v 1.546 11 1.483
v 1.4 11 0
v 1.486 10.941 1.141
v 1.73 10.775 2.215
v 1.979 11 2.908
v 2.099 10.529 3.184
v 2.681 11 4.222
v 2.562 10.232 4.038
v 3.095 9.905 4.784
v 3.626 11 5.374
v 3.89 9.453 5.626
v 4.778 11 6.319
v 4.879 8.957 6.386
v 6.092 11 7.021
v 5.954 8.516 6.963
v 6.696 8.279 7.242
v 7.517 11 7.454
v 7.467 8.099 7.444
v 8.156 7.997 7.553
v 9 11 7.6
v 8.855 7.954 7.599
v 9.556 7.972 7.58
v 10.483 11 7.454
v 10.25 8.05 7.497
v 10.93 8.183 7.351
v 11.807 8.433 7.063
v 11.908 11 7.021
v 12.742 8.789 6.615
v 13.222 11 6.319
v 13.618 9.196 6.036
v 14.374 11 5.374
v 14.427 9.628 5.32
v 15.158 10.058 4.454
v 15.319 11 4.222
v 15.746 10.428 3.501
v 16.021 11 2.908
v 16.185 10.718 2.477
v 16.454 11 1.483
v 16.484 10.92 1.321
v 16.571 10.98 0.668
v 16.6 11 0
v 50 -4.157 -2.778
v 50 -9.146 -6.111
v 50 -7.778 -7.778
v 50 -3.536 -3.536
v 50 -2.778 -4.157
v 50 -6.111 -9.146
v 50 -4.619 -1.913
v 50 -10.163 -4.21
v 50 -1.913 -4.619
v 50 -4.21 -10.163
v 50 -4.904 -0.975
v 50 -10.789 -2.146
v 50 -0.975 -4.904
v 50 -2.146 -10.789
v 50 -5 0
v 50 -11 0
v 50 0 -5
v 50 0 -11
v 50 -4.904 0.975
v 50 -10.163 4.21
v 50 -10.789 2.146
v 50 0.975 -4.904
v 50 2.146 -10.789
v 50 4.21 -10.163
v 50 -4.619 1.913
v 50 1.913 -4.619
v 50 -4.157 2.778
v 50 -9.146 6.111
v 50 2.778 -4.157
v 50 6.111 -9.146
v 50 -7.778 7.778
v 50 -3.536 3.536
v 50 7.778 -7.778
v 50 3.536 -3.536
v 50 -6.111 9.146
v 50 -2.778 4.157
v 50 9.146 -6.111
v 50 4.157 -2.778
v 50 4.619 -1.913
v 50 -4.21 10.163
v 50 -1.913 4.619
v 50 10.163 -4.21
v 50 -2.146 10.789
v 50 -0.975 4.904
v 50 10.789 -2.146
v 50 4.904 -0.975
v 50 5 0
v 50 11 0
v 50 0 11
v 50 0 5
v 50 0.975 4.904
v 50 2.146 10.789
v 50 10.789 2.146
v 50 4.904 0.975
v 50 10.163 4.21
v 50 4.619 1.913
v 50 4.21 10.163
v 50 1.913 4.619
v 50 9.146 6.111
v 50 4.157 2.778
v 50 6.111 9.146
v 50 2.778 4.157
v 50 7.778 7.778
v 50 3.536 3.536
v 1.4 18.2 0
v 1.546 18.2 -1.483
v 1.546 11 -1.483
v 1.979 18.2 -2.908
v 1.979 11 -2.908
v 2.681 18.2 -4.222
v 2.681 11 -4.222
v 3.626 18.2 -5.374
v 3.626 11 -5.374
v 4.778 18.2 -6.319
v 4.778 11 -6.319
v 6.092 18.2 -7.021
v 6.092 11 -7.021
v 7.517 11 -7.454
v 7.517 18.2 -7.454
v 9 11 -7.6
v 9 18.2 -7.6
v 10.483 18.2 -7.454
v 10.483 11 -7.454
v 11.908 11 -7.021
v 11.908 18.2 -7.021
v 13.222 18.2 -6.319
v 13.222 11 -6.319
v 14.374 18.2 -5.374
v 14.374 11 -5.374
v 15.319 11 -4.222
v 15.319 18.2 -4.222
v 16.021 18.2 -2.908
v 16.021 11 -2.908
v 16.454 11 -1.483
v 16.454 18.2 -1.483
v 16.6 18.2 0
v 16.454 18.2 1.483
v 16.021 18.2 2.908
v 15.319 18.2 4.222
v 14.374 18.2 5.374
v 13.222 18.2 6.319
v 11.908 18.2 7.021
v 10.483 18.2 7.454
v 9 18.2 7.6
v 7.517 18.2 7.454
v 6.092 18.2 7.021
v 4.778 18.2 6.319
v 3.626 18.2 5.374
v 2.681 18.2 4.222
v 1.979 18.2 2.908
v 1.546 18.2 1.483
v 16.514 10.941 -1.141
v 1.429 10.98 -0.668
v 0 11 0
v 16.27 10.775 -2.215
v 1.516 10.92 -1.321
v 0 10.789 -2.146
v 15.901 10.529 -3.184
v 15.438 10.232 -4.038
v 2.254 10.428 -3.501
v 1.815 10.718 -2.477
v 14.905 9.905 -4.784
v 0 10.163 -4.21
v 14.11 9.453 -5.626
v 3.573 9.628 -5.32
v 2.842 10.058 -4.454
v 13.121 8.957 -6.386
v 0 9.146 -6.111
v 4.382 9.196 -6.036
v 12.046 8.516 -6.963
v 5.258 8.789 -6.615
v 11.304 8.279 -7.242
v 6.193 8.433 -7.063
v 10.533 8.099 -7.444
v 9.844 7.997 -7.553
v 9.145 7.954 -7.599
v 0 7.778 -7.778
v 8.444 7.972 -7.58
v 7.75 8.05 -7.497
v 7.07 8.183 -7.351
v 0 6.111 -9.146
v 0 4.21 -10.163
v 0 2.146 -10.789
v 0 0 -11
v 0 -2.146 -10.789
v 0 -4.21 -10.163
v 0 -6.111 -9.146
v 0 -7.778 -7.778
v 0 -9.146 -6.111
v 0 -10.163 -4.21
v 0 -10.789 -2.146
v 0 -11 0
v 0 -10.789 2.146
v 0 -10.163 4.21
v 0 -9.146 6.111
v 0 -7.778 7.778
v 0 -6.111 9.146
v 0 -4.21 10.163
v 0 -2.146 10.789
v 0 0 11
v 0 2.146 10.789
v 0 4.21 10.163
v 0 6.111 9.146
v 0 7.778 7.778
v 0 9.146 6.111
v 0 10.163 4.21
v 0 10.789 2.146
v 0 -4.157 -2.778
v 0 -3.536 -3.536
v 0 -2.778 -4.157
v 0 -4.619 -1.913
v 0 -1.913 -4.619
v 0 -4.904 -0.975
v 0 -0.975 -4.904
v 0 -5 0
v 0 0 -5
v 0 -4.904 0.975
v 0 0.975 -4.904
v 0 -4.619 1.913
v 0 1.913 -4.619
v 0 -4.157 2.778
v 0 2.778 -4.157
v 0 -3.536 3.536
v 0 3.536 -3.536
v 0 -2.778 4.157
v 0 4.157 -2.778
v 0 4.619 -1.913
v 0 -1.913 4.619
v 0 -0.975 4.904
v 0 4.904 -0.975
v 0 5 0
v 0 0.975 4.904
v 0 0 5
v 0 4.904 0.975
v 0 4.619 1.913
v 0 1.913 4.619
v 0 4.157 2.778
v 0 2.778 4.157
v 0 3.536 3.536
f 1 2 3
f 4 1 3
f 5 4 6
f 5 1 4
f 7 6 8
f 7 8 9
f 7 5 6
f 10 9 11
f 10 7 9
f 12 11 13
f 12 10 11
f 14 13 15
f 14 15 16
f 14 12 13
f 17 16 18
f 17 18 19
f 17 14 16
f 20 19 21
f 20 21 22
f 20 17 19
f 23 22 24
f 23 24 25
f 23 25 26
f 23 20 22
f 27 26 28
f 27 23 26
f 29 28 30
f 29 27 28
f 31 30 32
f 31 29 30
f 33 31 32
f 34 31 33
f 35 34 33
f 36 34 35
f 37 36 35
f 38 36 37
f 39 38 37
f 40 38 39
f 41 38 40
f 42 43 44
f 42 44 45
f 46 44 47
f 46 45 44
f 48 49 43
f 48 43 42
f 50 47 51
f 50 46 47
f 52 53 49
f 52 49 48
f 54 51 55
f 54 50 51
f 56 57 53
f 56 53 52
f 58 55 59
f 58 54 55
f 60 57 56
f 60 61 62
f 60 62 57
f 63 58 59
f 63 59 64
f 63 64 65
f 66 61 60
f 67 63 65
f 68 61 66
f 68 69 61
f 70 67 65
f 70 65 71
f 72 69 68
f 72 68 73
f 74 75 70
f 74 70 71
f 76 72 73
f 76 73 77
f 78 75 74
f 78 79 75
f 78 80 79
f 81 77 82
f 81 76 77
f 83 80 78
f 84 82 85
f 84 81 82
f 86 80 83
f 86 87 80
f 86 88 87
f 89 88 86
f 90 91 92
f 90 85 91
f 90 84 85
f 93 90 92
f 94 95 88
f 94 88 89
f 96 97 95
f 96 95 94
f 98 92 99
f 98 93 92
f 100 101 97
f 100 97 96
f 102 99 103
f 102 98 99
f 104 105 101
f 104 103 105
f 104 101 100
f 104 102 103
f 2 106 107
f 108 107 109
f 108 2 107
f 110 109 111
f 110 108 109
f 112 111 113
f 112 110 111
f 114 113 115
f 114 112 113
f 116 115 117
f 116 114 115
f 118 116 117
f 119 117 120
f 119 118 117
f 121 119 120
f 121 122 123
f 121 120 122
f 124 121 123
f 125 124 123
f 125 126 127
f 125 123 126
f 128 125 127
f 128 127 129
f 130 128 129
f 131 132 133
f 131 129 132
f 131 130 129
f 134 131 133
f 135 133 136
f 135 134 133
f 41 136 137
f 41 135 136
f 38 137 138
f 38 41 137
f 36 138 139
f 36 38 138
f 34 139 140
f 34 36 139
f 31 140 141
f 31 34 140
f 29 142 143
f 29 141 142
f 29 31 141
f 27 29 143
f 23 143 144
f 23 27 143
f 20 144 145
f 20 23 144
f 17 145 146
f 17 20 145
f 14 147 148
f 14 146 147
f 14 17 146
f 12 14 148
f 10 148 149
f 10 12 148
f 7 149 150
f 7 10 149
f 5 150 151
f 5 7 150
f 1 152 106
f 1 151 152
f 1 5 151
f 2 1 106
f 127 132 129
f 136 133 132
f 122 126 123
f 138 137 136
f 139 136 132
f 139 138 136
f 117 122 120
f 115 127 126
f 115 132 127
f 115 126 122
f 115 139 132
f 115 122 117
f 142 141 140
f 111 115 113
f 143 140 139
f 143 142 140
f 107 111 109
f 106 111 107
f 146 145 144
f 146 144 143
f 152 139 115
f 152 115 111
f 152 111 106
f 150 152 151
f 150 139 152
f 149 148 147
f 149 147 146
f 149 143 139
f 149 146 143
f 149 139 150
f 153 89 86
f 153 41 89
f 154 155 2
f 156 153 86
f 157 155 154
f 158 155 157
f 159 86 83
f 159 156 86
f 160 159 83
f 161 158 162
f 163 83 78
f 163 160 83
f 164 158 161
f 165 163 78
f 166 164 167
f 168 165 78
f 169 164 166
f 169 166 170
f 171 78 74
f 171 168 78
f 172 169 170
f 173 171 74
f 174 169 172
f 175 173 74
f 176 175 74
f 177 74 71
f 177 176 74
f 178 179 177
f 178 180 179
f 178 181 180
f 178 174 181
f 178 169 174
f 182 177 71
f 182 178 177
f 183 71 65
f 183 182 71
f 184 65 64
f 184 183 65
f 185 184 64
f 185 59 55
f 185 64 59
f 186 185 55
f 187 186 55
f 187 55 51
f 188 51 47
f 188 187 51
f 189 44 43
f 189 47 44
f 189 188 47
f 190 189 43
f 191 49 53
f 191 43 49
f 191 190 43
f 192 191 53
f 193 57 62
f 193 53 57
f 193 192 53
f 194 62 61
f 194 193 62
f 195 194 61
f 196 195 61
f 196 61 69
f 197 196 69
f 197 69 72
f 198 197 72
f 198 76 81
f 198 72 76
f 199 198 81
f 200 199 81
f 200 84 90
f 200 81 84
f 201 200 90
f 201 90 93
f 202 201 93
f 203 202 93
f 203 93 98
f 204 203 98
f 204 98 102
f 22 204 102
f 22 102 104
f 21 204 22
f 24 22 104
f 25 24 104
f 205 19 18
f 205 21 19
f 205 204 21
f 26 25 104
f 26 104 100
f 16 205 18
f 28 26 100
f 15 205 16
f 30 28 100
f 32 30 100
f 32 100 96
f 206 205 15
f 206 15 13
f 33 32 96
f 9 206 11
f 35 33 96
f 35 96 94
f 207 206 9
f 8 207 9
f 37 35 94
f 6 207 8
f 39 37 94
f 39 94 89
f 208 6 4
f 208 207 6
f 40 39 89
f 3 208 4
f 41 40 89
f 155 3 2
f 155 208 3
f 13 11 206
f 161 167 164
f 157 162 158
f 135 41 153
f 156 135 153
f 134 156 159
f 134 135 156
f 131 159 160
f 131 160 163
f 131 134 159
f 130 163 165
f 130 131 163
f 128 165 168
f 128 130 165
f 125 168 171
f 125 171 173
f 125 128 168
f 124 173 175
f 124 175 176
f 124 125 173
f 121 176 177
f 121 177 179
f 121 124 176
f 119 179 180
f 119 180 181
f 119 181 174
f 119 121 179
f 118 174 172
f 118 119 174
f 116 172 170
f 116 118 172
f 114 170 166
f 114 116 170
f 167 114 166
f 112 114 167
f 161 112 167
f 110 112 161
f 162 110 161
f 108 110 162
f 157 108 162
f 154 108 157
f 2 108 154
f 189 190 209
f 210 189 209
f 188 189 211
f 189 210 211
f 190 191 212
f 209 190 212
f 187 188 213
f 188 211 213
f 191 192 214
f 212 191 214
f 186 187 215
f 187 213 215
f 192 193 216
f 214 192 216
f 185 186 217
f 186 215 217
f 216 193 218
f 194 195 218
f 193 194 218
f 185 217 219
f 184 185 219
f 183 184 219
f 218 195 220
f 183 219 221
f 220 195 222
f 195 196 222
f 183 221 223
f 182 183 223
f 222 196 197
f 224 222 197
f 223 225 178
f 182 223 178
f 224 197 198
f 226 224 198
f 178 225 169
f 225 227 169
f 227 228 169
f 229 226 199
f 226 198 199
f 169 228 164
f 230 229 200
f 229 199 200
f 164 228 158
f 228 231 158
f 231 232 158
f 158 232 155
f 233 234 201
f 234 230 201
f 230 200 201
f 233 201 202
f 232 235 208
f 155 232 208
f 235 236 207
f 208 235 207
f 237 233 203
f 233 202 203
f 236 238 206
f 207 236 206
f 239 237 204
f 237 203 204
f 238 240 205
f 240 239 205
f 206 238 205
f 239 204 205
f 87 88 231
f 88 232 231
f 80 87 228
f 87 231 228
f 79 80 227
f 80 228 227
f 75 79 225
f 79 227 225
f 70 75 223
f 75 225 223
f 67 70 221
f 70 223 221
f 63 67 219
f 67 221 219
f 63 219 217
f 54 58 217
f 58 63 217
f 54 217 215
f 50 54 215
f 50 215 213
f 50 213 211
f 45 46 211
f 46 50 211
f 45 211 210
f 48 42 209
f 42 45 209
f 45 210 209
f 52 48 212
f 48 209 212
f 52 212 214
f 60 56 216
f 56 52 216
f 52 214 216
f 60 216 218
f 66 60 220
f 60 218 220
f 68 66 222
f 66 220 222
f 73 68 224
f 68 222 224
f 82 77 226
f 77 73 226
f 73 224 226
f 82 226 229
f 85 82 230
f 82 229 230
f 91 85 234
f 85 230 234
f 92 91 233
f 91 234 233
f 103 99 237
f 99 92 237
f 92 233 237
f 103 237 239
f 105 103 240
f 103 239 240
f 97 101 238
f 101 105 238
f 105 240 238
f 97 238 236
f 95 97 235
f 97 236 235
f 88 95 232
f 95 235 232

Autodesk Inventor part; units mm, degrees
ref_plane "YZ Plane" through (0, 0, 0) normal (1, 0, 0) x (0, 1, 0)
ref_plane "XY Plane" through (0, 0, 0) normal (0, 0, 1) x (1, 0, 0)
sketch "Sketch1" plane through (0, 0, 0) normal (1, 0, 0) x (0, 1, 0)
  circle A0 centre (0, 0) radius 11
  circle A1 centre (0, 0) radius 5
  dimension "d0" = 22
  dimension "d1" = 10
extrude "Extrusion1" add sketch "Sketch1" along normal blind 50
ref_plane "Work Plane1" through (0, 11, 0) normal (0, 1, 0) x (-1, 0, 0)
sketch "Sketch2" plane through (0, 11, 0) normal (0, 1, 0) x (-1, 0, 0)
  circle A0 centre (-9, 0) radius 7.6
  point P0 (0, 0)
  dimension "d5" = 15.2
  dimension "d6" = 9
extrude "Extrusion2" add sketch "Sketch2" along normal blind 7.2 and the other way blind 5
properties part number "sample-transfer_shuttle-mockup"
